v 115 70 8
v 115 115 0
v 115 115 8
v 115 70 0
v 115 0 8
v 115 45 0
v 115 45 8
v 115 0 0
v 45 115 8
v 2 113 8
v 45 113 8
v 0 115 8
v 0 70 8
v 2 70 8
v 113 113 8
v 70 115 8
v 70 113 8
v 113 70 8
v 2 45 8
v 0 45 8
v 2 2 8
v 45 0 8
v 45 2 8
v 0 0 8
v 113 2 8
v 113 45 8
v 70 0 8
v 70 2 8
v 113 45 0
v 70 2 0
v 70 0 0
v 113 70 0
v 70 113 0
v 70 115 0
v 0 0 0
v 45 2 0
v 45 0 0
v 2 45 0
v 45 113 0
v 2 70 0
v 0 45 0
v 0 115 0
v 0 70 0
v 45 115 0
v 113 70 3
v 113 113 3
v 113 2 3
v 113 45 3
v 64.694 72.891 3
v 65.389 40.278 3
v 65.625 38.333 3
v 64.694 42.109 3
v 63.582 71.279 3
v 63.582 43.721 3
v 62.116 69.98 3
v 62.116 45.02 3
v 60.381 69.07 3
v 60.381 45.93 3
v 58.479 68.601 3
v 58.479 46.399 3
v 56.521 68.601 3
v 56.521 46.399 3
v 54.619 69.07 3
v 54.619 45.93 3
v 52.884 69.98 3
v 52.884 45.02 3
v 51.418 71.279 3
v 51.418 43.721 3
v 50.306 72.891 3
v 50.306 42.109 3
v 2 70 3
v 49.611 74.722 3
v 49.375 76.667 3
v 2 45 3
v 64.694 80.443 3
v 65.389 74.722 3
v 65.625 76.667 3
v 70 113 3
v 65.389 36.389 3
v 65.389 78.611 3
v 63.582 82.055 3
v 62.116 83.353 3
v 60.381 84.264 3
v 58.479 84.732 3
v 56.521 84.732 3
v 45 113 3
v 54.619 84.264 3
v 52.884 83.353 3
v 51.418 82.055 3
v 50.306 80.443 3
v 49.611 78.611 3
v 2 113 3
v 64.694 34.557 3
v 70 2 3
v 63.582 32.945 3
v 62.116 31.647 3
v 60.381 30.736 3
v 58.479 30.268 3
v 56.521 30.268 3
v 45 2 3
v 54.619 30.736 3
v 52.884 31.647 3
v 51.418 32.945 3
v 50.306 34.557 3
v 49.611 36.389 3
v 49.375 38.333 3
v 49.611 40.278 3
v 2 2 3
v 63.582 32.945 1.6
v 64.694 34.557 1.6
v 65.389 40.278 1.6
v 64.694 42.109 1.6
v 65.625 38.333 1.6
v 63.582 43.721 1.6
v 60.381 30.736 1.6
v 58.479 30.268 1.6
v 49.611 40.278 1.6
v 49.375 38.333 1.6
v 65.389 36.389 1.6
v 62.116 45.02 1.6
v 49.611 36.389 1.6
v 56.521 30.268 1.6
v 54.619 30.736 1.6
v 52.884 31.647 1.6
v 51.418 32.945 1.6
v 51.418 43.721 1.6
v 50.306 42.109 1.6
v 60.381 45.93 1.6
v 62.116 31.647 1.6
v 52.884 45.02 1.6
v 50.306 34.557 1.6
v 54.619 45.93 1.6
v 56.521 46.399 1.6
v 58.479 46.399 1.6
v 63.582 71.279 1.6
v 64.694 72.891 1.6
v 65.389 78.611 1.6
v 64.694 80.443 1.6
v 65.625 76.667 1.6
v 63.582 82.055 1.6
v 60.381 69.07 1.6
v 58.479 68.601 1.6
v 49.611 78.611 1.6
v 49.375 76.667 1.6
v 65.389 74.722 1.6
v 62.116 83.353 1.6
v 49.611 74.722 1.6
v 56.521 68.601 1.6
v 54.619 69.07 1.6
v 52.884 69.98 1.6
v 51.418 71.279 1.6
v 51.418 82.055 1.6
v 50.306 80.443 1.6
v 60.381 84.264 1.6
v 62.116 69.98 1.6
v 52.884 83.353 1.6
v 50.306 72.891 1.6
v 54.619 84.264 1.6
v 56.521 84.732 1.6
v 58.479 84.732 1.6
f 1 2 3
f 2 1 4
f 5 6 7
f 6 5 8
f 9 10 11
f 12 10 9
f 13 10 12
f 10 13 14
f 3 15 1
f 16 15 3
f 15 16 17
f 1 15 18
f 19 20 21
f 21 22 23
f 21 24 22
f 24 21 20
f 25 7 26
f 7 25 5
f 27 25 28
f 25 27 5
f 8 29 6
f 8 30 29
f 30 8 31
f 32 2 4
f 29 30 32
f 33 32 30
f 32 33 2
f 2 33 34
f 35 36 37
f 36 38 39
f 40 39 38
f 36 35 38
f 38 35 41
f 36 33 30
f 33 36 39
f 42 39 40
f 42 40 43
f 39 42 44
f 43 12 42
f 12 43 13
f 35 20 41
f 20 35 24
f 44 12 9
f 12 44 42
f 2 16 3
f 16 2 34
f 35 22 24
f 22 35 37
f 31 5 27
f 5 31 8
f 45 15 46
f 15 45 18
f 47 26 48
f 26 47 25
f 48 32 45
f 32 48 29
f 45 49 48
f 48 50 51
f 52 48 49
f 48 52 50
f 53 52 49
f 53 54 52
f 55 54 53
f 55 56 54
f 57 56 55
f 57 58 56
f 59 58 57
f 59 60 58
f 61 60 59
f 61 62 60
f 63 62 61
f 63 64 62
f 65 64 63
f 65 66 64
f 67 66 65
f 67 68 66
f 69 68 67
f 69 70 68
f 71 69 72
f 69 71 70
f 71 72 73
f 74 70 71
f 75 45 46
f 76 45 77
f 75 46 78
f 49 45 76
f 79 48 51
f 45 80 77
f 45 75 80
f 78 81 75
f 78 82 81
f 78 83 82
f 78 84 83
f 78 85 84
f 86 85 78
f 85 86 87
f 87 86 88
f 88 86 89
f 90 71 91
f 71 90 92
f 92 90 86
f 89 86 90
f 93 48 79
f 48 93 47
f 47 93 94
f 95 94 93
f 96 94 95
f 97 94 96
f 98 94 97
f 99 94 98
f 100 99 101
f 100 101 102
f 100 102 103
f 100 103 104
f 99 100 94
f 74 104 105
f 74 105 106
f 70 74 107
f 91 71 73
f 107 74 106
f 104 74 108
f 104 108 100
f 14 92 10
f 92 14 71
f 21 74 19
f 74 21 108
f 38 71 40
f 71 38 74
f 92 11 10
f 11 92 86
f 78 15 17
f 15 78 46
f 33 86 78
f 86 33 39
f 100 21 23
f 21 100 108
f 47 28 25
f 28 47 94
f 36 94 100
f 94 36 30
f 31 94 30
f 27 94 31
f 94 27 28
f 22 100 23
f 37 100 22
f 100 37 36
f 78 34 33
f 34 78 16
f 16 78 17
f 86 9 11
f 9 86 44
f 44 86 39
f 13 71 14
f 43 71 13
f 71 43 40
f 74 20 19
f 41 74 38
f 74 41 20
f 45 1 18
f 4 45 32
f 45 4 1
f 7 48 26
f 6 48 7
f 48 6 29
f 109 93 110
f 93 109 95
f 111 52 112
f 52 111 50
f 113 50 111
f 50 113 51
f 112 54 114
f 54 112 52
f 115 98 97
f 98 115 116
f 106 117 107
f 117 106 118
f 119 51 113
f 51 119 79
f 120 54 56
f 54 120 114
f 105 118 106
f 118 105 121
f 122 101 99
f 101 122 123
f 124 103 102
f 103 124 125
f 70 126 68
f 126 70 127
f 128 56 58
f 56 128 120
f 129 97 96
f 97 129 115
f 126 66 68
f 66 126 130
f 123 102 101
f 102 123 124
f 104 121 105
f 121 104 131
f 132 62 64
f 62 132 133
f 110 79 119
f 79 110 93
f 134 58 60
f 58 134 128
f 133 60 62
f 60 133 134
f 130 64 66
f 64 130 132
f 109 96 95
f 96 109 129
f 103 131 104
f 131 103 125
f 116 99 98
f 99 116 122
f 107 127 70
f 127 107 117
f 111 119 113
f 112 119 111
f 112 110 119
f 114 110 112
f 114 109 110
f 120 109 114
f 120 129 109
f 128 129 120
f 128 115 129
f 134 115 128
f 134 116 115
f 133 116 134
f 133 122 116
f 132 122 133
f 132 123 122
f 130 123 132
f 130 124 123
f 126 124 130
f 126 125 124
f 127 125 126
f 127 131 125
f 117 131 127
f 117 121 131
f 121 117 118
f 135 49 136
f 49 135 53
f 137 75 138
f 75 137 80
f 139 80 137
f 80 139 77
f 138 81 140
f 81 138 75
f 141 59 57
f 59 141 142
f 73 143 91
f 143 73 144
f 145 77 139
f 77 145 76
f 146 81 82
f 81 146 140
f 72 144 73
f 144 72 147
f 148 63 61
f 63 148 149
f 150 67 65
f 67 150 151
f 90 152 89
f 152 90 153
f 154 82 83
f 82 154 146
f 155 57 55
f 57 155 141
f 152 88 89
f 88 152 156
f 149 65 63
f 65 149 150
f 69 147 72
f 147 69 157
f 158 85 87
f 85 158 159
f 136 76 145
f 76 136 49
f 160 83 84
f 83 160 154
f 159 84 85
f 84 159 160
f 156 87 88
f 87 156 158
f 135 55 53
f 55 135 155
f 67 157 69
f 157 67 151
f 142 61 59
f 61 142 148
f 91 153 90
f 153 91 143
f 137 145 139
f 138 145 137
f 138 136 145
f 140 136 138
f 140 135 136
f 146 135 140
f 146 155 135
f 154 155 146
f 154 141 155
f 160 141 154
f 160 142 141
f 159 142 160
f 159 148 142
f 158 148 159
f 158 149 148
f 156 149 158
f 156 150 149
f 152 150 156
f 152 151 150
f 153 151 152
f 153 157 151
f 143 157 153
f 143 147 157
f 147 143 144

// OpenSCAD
length = 110;
width = 110;
height = 3;
rimHeight = 5;
rimThickness = 2;

notchLength = 25;

//Based on washer size:
washerDiameter = 16.25;
washerHeight = 1.4;
rimPadding = 1;

totalLength = length + rimThickness * 2 + rimPadding;
totalWidth = width + rimThickness * 2 + rimPadding;
totalHeight = height + rimHeight;
difference() {
    cube([totalLength, totalWidth, totalHeight]);
    translate([rimThickness, rimThickness, height])
        cube([length + rimPadding, width + rimPadding, rimHeight]);
    
    translate([totalLength/2 - notchLength/2, 0, 0])
        cube([notchLength, rimThickness, totalHeight]);
    translate([totalLength/2 - notchLength/2, totalWidth-rimThickness, 0])
        cube([notchLength, rimThickness, totalHeight]);


    translate([0, totalWidth/2 - notchLength/2, 0])
        cube([rimThickness, notchLength, totalHeight]);
    translate([totalLength-rimThickness, totalWidth/2 - notchLength/2, 0])
        cube([rimThickness, notchLength, totalHeight]);

    translate([
        totalLength/2,
        totalWidth/3,
        height - washerHeight])
        cylinder(washerHeight, d=washerDiameter);
    translate([
        totalLength/2,
        totalWidth * 2/3,
        height - washerHeight])
        cylinder(washerHeight, d=washerDiameter);
}
